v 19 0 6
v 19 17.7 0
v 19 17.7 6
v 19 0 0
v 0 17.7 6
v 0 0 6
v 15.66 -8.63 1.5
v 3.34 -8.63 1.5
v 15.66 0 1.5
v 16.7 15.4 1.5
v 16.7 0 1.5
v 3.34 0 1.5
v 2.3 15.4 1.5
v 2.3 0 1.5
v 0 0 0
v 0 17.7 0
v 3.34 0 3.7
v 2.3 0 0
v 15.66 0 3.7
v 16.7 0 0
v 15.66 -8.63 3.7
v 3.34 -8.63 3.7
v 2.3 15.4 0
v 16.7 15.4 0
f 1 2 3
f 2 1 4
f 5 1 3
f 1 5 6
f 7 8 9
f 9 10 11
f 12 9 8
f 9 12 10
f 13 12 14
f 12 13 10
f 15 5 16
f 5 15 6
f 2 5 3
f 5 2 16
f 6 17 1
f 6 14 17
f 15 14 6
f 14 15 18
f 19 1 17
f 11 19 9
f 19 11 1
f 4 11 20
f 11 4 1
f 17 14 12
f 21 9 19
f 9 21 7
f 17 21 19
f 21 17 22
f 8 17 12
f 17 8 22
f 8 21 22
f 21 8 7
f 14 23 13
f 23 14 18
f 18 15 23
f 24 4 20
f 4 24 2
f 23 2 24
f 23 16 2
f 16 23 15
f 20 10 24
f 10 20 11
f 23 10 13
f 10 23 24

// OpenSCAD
wall_thickness = 0.5;

// difference() {
//   // case
//   translate([-wall_thickness, -wall_thickness, 0]) cube(size=[19 + (wall_thickness*2), 17.7 + (wall_thickness*2), 4.7 + (wall_thickness*2)]);

//   // digistump with LED
//   translate([0,0,wall_thickness]) digistump();
// }

module digistump() {
  width = 19;
  length = 17.7;
  height = 4.5;
  usb_w = 12.32;
  usb_l = 8.73;
  solder_clearance_h = 1.5;
  solder_clearance_w = 2.3;

  translate([0, 0, solder_clearance_h]) cube(size=[width, length, height]);
  translate([(width/2) - (usb_w/2), -usb_l  + 0.1, solder_clearance_h]) cube(size=[usb_w, usb_l, 2.2]);

  // through hole soldered pins
  translate([0,0,0]) cube([solder_clearance_w, length, solder_clearance_h]);
  translate([width - solder_clearance_w,0,0]) cube([solder_clearance_w, length, solder_clearance_h]);
  translate([0,length - solder_clearance_w,0]) cube([width, solder_clearance_w, solder_clearance_h]);
}


digistump();
